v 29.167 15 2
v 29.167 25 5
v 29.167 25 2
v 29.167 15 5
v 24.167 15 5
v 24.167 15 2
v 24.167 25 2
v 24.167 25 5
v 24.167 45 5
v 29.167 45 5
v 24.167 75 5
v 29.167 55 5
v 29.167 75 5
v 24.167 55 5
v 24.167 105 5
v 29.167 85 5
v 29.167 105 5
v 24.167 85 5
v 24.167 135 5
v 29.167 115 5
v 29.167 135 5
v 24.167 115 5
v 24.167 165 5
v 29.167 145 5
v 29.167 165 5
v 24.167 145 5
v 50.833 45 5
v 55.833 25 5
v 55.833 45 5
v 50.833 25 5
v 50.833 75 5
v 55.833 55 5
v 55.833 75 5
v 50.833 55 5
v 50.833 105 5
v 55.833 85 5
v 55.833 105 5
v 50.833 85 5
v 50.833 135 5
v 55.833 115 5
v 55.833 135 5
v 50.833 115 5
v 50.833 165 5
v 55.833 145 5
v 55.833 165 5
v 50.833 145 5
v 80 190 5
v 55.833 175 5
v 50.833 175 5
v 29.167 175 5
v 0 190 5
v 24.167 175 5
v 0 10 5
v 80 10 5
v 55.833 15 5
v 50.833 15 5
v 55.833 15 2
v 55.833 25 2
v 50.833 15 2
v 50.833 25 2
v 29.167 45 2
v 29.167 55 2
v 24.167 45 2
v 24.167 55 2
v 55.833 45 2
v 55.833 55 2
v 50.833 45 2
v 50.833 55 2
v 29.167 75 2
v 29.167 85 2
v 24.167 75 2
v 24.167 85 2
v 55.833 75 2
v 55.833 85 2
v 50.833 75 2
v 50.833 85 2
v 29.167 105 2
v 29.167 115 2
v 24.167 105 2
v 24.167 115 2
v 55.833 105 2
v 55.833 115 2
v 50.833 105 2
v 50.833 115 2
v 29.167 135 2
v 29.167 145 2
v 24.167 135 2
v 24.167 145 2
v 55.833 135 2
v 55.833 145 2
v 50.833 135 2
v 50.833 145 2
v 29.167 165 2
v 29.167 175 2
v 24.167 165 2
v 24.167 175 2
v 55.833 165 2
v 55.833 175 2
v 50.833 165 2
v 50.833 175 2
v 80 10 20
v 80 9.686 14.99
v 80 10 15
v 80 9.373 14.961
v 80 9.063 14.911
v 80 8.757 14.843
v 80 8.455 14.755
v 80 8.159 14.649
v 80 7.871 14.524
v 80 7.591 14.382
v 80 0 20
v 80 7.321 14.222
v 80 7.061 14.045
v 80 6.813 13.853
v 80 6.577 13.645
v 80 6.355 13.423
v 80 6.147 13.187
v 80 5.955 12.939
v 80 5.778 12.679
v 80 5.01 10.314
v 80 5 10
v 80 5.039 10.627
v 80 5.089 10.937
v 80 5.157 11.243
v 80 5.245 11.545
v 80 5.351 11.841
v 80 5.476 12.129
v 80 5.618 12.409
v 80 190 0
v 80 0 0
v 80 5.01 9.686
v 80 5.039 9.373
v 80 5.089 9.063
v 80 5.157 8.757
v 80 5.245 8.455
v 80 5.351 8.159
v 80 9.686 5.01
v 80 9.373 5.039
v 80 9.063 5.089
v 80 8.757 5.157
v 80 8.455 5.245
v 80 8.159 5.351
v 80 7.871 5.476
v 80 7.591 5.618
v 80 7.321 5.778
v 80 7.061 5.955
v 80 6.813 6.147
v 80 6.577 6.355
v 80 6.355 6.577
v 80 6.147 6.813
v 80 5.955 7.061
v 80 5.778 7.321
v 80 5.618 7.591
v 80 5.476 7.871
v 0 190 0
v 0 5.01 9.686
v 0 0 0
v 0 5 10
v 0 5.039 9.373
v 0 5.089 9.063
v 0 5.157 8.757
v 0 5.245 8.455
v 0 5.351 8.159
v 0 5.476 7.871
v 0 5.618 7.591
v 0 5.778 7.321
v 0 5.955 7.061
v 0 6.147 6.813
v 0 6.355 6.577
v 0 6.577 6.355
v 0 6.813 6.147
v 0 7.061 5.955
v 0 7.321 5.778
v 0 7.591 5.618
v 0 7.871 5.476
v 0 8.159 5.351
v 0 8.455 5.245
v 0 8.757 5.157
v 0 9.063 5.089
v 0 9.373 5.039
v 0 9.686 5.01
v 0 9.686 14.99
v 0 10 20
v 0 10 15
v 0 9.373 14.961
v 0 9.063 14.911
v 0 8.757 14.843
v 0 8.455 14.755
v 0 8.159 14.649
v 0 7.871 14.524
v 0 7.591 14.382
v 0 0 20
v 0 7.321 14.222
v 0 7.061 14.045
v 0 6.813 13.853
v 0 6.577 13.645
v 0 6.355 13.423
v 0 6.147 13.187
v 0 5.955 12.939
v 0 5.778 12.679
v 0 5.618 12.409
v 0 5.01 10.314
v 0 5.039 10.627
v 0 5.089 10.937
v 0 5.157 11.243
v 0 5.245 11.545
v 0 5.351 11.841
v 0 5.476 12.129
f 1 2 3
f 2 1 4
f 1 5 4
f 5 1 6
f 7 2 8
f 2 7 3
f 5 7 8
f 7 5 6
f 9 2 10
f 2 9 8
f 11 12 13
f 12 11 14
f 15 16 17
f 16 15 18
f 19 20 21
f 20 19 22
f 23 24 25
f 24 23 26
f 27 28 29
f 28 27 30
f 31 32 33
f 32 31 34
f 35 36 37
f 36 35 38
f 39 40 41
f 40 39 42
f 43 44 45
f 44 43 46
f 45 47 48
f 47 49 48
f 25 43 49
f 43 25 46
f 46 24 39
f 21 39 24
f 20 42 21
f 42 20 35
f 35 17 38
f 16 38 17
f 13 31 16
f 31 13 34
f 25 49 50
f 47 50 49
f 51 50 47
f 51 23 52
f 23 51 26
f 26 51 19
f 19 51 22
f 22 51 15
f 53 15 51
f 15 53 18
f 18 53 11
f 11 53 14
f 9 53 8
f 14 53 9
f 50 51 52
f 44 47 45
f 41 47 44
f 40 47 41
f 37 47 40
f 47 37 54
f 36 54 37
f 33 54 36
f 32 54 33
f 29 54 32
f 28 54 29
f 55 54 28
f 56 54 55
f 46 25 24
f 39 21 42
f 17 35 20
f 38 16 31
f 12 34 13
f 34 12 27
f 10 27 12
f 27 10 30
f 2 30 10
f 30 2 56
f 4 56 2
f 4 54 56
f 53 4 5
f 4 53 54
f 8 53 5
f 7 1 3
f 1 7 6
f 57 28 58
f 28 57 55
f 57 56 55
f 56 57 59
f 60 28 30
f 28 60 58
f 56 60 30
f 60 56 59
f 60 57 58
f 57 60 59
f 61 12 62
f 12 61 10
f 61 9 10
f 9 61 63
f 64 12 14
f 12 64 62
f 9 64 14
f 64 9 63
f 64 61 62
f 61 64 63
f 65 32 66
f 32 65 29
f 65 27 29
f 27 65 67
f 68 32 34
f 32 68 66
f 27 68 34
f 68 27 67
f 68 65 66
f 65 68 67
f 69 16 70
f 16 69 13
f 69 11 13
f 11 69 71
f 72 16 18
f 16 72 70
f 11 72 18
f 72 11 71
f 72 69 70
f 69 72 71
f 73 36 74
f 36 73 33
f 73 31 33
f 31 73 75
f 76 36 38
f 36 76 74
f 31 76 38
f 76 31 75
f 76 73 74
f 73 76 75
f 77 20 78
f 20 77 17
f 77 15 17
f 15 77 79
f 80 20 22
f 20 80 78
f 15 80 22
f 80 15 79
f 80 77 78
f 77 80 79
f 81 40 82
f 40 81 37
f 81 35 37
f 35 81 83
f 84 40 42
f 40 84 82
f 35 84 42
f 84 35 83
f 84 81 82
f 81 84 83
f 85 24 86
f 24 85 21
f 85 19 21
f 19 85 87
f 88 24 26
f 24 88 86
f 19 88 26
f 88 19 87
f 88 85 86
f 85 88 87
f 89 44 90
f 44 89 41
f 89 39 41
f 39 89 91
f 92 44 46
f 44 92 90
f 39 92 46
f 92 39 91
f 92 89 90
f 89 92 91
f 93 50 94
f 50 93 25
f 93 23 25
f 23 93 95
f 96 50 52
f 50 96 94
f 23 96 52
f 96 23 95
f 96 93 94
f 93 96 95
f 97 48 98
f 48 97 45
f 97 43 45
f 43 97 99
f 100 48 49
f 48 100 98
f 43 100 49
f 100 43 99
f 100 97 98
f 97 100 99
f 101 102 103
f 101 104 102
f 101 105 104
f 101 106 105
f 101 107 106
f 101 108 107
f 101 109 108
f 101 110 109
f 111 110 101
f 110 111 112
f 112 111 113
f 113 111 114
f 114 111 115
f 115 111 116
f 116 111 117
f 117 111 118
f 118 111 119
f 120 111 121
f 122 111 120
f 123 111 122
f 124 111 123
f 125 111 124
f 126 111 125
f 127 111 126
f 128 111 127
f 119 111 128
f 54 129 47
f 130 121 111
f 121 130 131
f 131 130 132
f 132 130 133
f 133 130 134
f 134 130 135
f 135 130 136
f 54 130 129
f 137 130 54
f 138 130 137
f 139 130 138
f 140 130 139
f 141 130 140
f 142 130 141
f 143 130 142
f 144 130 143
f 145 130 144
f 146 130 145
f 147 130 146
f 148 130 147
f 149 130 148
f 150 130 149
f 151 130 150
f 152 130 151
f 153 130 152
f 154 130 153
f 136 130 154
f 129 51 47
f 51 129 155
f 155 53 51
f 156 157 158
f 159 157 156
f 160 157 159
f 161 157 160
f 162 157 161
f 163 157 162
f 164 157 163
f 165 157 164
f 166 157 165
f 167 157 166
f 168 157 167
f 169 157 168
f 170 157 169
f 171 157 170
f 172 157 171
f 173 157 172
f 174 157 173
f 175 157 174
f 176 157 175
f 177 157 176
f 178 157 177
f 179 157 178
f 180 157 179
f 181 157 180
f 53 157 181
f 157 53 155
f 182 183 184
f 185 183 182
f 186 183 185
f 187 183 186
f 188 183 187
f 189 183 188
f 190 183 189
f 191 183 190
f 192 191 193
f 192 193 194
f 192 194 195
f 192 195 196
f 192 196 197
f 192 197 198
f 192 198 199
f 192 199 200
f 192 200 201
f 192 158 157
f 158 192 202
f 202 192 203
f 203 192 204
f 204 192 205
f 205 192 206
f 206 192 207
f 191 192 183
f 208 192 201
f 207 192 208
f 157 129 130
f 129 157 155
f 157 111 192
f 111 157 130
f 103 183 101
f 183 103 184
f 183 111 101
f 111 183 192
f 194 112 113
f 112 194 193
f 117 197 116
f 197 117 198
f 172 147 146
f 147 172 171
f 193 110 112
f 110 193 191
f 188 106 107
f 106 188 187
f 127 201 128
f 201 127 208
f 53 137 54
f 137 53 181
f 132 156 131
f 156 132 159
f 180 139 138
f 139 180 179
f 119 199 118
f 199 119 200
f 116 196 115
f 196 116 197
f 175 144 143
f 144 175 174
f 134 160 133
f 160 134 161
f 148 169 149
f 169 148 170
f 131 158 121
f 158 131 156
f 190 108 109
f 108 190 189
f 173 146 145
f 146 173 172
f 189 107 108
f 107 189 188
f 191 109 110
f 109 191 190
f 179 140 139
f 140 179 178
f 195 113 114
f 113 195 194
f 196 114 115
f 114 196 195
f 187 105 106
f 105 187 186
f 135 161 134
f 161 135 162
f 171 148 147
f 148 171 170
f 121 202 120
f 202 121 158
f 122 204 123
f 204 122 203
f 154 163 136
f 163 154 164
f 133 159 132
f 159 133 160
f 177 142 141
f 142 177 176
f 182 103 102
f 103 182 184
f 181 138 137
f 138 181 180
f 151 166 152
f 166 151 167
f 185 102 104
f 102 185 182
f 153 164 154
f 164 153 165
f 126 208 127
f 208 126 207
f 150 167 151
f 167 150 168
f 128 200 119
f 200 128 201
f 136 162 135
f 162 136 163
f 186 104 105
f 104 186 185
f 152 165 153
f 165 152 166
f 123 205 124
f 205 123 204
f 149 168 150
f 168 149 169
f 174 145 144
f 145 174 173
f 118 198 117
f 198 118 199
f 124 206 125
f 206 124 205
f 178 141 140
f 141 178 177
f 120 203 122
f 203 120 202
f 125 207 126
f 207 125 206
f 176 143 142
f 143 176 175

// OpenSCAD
$fn = 100;

rack_diameter = 10;
rack_width = 155;

brace_height = 180;
brace_width = 240 / 3;
brace_thickness = 5;

support_width = 5;
support_height = 10;
support_inset = 3;
support_every = 30;

module draw_support() {
    cube([support_height, support_width, rack_width + support_inset * 2]);
}

module draw_brace() {
    // Support portion
    difference() {
        cube([brace_width, brace_thickness, brace_height]);
        
        // Center support areas
        for (i = [(rack_diameter / 2):support_every:brace_height]) {
            offset = rack_diameter + brace_width;
            
            translate([brace_width / 3 - support_width / 2, brace_thickness - support_inset, brace_height - i - support_height])
                cube([support_width, support_inset, support_height]);
            translate([brace_width / 3 * 2 - support_width / 2, brace_thickness - support_inset, brace_height - i - support_height])
                cube([support_width, support_inset, support_height]);
        }
    }
        
    // Top portion
    translate([0, 0, brace_height])
    difference() {
        cube([brace_width, rack_diameter + 2 * brace_thickness, rack_diameter]);
        
        translate([0, brace_thickness + rack_diameter / 2, 0])
        rotate([0, 90, 0])
        cylinder(h = brace_width, d = rack_diameter);
    }
}

translate([0, brace_height + rack_diameter, 0])
rotate([90, 0, 0])
draw_brace();



/*
translate([0, support_height, 0])
    rotate([-90, 0, 0])
        draw_support();
*/
